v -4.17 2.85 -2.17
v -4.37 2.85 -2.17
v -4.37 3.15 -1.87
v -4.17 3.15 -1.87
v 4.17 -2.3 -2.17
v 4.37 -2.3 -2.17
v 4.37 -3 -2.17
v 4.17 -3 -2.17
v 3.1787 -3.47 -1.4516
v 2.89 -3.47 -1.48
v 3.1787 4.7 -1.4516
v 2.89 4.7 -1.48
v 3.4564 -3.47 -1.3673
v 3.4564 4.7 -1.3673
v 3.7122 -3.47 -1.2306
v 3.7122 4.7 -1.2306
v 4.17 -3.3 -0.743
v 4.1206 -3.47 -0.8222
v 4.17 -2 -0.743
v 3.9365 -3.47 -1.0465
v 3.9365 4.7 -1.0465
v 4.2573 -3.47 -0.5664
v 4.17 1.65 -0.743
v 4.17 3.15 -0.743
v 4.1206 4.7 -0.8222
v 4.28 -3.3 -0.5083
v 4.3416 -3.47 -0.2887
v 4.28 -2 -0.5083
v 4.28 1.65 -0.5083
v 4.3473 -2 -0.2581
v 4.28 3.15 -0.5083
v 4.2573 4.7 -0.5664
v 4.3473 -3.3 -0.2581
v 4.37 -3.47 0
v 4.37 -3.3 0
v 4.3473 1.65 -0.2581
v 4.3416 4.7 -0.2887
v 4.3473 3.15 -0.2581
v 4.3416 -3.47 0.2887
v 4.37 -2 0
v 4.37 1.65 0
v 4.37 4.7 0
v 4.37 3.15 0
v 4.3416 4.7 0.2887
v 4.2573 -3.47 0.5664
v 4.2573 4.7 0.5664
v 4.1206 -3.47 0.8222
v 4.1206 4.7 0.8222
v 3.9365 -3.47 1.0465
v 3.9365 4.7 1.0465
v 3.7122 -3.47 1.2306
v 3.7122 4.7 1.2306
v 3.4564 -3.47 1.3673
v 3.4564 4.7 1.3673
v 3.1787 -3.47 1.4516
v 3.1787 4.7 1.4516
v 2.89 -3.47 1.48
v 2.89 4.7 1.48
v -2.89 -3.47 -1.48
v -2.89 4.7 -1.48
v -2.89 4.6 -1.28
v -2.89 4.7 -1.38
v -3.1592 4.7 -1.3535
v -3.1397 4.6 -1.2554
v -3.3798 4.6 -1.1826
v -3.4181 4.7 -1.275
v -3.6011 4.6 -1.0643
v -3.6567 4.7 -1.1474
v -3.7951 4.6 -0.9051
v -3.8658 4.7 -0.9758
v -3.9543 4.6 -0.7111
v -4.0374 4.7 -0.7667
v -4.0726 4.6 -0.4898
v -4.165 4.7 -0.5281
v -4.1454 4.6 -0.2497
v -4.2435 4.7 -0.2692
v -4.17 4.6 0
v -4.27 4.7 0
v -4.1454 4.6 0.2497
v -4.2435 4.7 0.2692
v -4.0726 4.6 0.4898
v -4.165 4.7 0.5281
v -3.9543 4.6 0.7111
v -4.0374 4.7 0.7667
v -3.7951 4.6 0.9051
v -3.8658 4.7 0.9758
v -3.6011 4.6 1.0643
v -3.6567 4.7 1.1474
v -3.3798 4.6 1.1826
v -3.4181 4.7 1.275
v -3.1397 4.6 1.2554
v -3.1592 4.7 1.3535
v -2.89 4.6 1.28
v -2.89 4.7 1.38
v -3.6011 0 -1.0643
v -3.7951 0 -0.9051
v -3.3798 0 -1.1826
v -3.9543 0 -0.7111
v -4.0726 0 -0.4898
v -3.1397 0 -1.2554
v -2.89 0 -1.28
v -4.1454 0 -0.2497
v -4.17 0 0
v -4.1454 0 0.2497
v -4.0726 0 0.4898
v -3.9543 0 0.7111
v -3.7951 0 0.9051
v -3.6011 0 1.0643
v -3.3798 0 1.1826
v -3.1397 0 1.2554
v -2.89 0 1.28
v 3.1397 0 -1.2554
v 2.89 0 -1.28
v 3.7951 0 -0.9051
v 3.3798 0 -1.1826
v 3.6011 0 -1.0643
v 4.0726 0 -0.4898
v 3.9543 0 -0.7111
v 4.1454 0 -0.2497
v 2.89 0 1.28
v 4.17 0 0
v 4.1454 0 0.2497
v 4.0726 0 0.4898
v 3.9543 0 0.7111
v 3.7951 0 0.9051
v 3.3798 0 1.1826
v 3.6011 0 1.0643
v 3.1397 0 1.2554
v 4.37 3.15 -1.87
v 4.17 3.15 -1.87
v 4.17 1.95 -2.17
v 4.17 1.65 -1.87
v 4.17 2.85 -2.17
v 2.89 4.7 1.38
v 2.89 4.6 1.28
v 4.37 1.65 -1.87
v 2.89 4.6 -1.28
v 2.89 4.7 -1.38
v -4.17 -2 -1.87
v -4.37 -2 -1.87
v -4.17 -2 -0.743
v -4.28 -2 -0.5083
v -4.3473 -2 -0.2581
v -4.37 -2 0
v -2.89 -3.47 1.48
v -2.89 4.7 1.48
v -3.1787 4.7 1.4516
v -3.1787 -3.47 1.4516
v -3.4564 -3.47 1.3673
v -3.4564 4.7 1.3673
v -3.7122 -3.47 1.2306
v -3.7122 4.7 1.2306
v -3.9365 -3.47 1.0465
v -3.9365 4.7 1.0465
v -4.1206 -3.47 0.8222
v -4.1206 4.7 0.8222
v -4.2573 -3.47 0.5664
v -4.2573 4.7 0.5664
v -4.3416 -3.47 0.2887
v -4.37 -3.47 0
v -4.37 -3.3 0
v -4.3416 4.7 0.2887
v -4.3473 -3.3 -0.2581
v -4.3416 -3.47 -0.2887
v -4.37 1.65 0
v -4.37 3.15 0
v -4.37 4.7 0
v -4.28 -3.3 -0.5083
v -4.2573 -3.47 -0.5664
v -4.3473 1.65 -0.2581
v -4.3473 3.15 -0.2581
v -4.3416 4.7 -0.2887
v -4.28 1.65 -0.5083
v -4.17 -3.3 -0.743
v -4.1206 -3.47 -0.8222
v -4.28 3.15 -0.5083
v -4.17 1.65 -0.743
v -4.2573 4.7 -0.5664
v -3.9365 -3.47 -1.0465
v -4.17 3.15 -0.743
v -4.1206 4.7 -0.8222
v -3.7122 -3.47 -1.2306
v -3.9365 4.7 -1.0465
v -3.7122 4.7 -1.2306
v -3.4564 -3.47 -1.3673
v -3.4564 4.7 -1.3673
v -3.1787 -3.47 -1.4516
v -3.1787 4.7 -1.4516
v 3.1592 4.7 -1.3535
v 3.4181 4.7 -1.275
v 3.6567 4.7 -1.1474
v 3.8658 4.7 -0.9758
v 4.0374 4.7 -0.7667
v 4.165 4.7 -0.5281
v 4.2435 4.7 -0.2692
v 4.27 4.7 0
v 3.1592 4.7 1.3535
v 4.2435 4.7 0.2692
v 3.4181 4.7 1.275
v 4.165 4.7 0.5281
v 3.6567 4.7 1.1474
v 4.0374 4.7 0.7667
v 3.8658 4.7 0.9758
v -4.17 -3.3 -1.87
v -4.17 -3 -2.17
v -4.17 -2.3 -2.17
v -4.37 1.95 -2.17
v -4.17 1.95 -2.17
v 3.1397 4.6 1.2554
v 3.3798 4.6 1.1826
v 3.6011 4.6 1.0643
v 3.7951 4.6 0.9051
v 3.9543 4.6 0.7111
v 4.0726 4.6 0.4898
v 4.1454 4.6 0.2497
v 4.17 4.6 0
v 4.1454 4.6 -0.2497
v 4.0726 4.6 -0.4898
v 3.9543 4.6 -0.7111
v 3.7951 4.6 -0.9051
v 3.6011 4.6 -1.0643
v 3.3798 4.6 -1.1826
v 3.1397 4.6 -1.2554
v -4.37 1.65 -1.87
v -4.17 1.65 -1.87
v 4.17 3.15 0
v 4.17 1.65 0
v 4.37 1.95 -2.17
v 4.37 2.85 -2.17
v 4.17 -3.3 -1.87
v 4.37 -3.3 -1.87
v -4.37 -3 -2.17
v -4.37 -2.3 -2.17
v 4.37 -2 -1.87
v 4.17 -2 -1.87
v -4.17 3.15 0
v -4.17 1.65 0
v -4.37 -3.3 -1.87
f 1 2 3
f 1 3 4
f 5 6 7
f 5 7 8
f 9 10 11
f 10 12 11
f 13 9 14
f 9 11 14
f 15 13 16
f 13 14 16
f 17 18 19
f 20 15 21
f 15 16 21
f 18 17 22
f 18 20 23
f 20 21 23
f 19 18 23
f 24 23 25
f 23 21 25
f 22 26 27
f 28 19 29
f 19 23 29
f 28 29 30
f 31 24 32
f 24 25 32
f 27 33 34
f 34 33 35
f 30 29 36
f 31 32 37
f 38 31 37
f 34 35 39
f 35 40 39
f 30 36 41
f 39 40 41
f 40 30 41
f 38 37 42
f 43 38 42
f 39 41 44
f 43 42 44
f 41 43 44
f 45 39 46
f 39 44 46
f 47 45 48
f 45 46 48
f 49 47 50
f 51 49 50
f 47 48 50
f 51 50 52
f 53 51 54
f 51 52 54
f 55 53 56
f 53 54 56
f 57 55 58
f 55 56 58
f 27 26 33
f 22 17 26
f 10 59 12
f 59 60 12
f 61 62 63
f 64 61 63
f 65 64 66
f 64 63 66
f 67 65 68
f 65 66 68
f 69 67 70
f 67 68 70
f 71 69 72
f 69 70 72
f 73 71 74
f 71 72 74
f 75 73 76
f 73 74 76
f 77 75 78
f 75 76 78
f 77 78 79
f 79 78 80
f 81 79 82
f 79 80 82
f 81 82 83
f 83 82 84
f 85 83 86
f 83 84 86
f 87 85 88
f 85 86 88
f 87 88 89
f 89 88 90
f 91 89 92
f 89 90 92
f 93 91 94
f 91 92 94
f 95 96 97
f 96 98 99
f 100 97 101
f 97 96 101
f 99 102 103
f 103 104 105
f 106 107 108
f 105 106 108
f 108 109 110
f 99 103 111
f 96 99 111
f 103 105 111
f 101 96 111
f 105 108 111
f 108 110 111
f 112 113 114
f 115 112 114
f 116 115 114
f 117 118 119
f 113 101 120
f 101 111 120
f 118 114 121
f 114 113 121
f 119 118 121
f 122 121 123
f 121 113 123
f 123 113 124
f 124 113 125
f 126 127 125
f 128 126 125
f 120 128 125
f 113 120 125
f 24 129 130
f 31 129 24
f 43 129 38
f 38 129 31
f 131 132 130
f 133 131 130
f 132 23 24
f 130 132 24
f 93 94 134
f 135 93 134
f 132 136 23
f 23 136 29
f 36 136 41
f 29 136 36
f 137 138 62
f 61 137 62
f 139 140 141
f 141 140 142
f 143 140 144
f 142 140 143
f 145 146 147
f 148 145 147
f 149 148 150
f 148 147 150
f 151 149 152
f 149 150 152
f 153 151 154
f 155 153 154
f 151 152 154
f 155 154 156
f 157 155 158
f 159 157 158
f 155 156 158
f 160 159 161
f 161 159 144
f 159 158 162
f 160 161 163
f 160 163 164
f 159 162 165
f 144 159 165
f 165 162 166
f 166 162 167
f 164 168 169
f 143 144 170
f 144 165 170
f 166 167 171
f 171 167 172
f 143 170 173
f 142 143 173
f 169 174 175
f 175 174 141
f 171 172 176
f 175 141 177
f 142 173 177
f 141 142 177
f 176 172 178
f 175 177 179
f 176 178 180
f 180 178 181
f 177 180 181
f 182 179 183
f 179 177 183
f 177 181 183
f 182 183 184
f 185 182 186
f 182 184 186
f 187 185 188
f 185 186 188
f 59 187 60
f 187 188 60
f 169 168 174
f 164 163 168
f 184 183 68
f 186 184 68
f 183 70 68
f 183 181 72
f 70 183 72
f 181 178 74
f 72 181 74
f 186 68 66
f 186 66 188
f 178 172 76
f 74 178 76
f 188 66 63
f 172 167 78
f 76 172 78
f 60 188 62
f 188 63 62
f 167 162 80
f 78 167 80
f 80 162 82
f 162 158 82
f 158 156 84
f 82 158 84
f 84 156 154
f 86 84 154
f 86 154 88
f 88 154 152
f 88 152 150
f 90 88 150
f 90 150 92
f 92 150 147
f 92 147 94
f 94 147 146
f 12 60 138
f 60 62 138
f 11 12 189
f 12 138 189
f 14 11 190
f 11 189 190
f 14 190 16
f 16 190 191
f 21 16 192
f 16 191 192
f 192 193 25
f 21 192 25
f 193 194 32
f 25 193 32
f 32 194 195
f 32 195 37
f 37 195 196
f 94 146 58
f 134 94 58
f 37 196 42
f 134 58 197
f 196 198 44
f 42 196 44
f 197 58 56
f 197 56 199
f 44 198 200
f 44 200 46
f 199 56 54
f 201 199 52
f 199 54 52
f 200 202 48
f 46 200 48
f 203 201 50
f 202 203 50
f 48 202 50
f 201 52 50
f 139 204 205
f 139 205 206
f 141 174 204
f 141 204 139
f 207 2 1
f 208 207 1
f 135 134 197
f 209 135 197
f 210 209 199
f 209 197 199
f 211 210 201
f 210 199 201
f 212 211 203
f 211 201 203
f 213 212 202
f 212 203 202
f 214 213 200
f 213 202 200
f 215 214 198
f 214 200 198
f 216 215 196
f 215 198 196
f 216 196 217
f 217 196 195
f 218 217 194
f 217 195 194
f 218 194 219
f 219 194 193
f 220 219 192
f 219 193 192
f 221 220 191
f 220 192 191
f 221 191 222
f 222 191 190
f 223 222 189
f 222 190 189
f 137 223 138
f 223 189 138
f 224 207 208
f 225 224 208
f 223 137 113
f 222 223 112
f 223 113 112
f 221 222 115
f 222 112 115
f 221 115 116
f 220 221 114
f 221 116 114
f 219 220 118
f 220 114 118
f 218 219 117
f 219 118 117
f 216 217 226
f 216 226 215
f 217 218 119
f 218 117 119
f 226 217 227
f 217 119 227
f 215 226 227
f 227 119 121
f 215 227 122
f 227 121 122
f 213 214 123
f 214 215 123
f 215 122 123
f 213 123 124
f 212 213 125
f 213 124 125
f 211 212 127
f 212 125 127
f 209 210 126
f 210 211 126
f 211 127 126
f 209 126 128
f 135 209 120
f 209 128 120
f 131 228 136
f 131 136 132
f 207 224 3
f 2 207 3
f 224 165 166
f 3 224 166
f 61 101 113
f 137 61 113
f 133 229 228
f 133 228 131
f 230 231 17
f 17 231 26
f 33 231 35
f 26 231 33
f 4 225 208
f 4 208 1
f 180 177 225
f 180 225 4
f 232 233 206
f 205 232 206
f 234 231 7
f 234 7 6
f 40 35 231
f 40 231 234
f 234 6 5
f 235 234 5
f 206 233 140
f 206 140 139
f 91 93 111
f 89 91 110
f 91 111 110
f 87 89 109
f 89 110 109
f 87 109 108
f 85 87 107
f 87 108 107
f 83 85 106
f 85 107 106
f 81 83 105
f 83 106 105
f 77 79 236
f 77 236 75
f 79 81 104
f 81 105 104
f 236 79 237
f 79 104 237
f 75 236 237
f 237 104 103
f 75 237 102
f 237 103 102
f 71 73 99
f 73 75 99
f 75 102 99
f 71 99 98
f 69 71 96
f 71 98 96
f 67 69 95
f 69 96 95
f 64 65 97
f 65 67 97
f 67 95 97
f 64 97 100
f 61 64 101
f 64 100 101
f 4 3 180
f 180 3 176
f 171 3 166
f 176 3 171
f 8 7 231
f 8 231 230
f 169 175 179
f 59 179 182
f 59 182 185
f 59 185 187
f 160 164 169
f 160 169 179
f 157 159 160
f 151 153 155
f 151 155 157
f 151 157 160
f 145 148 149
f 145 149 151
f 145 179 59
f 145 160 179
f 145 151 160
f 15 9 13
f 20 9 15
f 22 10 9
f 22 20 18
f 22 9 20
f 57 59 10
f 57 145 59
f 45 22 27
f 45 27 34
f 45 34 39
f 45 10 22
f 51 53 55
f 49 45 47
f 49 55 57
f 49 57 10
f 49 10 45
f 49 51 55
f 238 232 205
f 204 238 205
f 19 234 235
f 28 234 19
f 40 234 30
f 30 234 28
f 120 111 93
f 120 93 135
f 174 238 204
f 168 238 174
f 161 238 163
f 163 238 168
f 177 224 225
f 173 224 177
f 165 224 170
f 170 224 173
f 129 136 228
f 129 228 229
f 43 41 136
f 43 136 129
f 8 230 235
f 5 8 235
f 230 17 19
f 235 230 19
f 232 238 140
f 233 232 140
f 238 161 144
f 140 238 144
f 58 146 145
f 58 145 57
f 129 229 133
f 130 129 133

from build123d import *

# Parameters (mm, degrees)
PAD003_DEPTH    = 4.7
CHAMFER001_SIZE = 0.1
PAD010_DEPTH    = 3.47
SKETCH019_W     = 0.2
SKETCH019_H     = 1.5
SKETCH019_H_2   = 1.3
PAD012_DEPTH    = 2.17
CHAMFER002_SIZE = 0.3


with BuildPart() as part:
    # Sketch002 → Pad003 (new body)
    with BuildSketch(Plane.XZ):
        with BuildLine():
            ThreePointArc((-2.89, 1.48), (-4.37, 0), (-2.89, -1.48))
            Line((-2.89, -1.48), (2.89, -1.48))
            ThreePointArc((2.89, -1.48), (4.37, 0), (2.89, 1.48))
            Line((-2.89, 1.48), (2.89, 1.48))
        make_face()
        with BuildLine():
            ThreePointArc((-2.89, 1.28), (-4.17, 0), (-2.89, -1.28))
            Line((-2.89, -1.28), (2.89, -1.28))
            ThreePointArc((2.89, -1.28), (4.17, 0), (2.89, 1.28))
            Line((-2.89, 1.28), (2.89, 1.28))
        make_face(mode=Mode.SUBTRACT)
    extrude(amount=-PAD003_DEPTH)

    # Chamfer001
    chamfer001_edges = [part.edges().sort_by_distance(p)[0] for p in [
        (0, 4.7, 1.28),
    ]]
    chamfer(chamfer001_edges, length=CHAMFER001_SIZE)

    # Sketch014 → Pad010 (join)
    with BuildSketch(Plane.XZ):
        with BuildLine():
            ThreePointArc((-2.89, 1.48), (-4.37, 0), (-2.89, -1.48))
            Line((-2.89, -1.48), (2.89, -1.48))
            ThreePointArc((2.89, -1.48), (4.37, 0), (2.89, 1.48))
            Line((-2.89, 1.48), (2.89, 1.48))
        make_face()
    extrude(amount=PAD010_DEPTH)

    # Sketch019 → Pad012 (join)
    with BuildSketch(Plane.XY):
        with Locations((-4.27, 2.4)):
            Rectangle(SKETCH019_W, SKETCH019_H)
        with Locations((-4.27, -2.65)):
            Rectangle(SKETCH019_W, SKETCH019_H_2)
    pad012 = extrude(amount=-PAD012_DEPTH)

    # Mirrored002: Pad012 across Sketch019 V_Axis
    add(pad012.mirror(Plane(origin=(0, 0, 0), x_dir=(0, 0, 1), z_dir=(1, 0, 0))))

    # Chamfer002
    chamfer002_edges = [part.edges().sort_by_distance(p)[0] for p in [
        (4.27, -3.3, -2.17),
        (4.27, -2, -2.17),
        (4.27, 1.65, -2.17),
        (4.27, 3.15, -2.17),
        (-4.27, -3.3, -2.17),
        (-4.27, -2, -2.17),
        (-4.27, 1.65, -2.17),
        (-4.27, 3.15, -2.17),
    ]]
    chamfer(chamfer002_edges, length=CHAMFER002_SIZE)


solid = part.part
